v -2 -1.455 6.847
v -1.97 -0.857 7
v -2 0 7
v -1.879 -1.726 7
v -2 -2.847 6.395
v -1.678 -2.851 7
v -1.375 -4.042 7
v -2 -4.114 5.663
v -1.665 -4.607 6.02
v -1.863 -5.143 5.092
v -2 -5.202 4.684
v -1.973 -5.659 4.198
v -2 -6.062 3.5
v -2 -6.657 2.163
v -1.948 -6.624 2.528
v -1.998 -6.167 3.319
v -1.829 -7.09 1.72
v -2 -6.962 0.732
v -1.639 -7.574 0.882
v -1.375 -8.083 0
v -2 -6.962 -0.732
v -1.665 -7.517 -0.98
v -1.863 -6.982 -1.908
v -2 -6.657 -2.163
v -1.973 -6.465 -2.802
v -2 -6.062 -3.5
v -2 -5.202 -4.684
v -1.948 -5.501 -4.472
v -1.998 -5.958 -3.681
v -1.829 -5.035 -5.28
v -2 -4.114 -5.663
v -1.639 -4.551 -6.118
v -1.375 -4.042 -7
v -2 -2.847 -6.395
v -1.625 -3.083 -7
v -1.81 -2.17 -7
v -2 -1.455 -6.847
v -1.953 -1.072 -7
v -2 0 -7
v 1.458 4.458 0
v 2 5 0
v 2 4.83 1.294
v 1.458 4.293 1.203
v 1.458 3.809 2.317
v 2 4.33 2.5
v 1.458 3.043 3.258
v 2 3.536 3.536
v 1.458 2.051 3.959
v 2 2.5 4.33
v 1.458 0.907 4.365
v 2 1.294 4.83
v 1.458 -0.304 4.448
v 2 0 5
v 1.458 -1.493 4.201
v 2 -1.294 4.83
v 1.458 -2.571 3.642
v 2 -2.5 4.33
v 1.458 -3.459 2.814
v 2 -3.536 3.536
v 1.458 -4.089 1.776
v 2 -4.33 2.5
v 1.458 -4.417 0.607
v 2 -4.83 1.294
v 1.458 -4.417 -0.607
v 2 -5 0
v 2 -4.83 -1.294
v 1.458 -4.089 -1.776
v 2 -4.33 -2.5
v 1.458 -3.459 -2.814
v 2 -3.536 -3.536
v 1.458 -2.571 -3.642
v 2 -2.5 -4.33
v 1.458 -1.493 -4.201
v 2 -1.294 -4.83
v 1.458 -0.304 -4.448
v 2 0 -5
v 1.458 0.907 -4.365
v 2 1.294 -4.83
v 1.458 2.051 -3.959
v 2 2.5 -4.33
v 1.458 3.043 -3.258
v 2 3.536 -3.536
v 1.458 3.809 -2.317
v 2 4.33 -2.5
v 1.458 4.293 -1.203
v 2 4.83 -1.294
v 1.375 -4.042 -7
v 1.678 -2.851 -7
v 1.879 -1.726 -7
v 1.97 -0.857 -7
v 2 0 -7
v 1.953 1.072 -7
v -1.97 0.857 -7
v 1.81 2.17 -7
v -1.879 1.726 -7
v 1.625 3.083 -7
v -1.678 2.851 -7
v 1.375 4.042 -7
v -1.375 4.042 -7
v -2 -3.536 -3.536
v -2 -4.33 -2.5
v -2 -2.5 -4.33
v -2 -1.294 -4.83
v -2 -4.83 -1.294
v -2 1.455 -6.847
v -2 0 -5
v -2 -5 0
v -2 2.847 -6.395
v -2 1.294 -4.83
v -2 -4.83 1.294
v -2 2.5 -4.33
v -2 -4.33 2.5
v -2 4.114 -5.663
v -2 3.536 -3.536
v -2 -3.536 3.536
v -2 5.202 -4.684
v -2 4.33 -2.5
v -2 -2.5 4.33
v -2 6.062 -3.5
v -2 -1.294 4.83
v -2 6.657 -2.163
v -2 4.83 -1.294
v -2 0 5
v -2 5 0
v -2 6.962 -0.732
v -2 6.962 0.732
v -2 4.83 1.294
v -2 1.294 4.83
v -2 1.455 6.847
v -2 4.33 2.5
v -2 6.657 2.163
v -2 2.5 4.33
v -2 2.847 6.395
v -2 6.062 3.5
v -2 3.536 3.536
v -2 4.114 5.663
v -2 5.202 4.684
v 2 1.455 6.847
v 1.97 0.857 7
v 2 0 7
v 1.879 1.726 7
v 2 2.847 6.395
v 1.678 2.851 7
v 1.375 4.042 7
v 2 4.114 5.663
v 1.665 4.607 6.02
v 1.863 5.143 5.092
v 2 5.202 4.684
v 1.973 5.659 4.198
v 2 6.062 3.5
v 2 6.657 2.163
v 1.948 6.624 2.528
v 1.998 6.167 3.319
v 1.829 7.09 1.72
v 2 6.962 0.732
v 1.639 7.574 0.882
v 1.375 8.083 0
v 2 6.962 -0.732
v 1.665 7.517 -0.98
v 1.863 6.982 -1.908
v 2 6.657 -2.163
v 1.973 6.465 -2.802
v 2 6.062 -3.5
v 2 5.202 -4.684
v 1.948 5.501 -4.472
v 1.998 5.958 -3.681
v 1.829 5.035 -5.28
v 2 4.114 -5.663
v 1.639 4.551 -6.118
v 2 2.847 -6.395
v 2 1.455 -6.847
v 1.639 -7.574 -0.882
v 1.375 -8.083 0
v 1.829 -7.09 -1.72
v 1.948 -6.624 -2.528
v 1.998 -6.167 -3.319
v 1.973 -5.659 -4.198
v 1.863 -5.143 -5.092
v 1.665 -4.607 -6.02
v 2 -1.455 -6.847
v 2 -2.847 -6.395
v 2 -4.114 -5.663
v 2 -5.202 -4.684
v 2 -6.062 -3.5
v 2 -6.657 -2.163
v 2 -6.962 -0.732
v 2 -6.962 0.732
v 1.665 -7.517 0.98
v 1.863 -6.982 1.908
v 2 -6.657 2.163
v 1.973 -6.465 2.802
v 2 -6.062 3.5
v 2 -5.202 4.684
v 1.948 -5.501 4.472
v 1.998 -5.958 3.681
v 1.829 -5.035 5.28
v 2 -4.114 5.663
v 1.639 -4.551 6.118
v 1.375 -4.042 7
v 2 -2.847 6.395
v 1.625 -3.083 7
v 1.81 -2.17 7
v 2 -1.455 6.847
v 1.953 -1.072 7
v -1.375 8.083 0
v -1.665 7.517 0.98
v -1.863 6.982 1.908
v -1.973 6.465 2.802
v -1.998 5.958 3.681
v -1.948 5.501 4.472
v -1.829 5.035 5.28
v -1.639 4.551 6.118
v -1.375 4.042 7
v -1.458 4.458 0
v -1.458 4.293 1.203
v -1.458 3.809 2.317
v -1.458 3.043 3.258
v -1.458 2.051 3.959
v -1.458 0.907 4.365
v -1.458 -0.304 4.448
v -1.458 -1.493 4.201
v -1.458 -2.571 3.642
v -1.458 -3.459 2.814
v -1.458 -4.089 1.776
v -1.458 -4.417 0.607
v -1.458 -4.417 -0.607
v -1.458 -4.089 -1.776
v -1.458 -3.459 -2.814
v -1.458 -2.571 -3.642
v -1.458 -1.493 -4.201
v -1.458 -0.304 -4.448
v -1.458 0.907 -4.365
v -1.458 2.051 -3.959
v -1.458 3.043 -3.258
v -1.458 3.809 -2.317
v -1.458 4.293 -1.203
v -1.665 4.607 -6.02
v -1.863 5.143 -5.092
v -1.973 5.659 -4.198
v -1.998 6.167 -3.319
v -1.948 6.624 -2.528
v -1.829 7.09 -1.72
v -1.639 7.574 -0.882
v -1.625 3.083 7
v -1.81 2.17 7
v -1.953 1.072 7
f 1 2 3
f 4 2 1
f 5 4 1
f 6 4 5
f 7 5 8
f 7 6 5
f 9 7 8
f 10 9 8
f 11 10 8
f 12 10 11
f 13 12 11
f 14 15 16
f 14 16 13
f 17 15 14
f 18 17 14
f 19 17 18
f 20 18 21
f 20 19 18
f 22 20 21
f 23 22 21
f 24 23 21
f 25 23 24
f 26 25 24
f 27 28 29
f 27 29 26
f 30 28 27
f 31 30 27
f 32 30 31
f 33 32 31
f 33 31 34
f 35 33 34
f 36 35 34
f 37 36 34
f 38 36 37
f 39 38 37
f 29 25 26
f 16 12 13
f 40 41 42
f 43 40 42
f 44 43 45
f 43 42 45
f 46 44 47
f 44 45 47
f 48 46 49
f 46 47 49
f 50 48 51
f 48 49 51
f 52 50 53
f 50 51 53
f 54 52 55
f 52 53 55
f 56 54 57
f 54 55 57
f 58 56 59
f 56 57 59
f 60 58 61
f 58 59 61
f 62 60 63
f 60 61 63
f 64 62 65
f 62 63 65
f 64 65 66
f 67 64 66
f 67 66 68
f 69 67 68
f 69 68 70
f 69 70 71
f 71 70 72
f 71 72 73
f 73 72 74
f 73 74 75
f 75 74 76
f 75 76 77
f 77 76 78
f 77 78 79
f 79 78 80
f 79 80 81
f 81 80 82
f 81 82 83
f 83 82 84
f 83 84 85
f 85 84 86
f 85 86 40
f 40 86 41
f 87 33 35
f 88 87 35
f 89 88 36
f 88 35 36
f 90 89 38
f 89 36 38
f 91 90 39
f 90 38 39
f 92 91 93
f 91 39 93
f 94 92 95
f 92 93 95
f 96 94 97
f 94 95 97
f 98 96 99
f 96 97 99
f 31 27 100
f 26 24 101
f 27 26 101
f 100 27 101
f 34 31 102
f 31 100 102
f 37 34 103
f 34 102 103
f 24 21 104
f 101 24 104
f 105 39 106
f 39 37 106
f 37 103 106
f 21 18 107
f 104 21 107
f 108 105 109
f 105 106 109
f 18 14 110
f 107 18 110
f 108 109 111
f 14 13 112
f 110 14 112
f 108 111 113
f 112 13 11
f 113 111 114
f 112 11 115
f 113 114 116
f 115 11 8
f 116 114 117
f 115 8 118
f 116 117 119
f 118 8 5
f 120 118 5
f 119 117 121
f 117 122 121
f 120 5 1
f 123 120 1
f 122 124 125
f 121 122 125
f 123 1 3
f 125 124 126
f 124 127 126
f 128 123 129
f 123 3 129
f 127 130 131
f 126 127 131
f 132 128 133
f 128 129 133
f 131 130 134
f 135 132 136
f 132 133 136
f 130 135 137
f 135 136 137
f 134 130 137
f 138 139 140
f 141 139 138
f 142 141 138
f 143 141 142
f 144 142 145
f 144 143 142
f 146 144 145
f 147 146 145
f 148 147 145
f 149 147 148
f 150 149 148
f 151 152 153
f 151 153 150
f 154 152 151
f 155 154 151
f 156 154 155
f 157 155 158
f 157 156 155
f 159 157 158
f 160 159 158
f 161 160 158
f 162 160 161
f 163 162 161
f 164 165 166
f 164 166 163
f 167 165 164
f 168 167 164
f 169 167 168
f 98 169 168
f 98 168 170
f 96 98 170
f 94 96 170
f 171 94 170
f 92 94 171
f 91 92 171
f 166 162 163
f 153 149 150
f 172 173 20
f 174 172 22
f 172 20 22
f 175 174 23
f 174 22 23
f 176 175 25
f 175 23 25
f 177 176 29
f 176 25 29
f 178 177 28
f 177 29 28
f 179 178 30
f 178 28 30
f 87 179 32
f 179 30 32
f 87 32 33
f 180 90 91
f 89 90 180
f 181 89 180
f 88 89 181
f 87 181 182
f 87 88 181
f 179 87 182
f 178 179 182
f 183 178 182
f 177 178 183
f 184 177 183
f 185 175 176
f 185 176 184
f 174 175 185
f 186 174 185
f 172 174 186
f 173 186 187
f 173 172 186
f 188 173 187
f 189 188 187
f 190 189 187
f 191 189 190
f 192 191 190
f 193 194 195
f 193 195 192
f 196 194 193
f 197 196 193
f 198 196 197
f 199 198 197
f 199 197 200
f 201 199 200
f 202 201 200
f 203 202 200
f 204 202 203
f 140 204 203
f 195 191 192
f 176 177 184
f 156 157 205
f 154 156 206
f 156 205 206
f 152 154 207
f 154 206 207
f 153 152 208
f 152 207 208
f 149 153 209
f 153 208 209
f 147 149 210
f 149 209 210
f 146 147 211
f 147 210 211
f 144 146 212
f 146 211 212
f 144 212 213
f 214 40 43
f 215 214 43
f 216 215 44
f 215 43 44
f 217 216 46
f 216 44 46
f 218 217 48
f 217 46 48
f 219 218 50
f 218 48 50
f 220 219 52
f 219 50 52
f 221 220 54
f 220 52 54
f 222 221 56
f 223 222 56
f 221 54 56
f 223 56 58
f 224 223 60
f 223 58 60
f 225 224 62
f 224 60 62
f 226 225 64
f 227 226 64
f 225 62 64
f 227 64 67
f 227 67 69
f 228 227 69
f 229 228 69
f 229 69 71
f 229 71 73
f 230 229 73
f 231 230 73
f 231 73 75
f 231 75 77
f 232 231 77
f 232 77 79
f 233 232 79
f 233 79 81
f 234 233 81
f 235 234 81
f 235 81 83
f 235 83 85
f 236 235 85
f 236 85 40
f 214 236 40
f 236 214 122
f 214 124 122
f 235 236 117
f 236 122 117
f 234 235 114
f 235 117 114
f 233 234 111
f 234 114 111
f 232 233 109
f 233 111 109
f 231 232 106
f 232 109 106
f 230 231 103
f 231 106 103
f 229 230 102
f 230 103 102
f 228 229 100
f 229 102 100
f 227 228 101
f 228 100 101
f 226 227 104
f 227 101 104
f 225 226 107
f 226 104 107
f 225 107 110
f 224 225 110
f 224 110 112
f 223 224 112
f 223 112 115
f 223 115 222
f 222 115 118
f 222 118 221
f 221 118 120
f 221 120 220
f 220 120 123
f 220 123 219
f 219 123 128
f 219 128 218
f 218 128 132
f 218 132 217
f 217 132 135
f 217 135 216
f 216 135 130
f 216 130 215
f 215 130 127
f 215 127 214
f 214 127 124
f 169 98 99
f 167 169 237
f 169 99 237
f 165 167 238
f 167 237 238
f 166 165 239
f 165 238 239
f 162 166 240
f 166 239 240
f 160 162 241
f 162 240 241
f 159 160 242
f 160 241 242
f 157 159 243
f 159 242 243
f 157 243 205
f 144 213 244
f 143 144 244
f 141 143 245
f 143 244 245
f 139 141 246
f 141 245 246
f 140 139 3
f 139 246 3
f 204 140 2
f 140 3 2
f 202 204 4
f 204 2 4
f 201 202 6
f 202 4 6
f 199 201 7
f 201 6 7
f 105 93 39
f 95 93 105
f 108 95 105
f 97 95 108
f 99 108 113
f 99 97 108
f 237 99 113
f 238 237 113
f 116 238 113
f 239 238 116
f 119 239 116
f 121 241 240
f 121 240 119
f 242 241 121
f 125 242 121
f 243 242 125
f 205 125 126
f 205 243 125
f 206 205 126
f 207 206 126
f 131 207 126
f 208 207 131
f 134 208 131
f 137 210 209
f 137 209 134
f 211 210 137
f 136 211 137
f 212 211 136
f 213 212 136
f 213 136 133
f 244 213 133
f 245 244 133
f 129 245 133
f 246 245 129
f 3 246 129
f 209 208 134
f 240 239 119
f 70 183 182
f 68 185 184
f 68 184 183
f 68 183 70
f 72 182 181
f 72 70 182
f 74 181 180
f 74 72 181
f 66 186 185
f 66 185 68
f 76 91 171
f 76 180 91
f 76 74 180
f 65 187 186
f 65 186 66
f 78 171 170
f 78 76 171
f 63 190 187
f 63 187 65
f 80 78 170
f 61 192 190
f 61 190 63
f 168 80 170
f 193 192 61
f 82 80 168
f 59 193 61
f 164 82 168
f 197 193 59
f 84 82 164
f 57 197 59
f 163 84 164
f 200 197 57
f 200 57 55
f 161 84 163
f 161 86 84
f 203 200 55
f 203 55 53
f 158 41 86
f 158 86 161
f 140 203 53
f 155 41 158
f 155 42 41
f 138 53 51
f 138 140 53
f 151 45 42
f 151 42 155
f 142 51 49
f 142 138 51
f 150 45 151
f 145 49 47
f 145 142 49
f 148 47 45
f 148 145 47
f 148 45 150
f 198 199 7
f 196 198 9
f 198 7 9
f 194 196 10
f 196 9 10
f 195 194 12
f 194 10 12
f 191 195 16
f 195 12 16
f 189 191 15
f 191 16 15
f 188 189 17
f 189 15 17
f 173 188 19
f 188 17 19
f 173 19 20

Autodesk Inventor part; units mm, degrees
sketch "B" plane through (0, 0, 0) normal (1, 0, 0) x (0, 1, 0)
  line L0 (-4.0415, 7) -> (-8.0829, 0)
  line L1 (-8.0829, 0) -> (-4.0415, -7)
  line L2 (-4.0415, -7) -> (4.0415, -7)
  line L3 (4.0415, -7) -> (8.0829, 0)
  line L4 (8.0829, 0) -> (4.0415, 7)
  line L5 (4.0415, 7) -> (-4.0415, 7)
extrude "Extrusion1" add sketch "B" along normal mid plane 4
sketch "Sketch_2" plane through (0, 0, 0) normal (0, 0, 1) x (1, 0, 0)
  line L0 (2, 0) -> (-2, 0)
  line L1 (-2, 0) -> (-2, 5)
  line L2 (-2, 5) -> (-1.4585, 4.4585)
  line L3 (-1.4585, 4.4585) -> (1.4585, 4.4585)
  line L4 (1.4585, 4.4585) -> (2, 5)
  line L5 (2, 5) -> (2, 0)
  line L6 (2, 0) -> (-2, 0)
revolve "Revolution1" cut sketch "Sketch_2" angle 360 about axis through (2, 0, 0) along (1, 0, 0)
thread "Thread1" size "M10x1" class "6H" standard "ISO Metric profile" full length
sketch "Sketch_3" plane through (0, 0, 0) normal (0, 0, 1) x (1, 0, 0)
  line L0 (50, 0) -> (-50, 0)
  line L1 (-7, 1) -> (-2, 1)
  line L2 (-2, 1) -> (-2, 7)
  line L3 (-2, 7) -> (0, 10.4641)
  line L4 (0, 10.4641) -> (2, 7)
  line L5 (2, 7) -> (2, 1)
  line L6 (2, 1) -> (7, 1)
  line L7 (7, 1) -> (7, 17)
  line L8 (7, 17) -> (-7, 17)
  line L9 (-7, 17) -> (-7, 1)
revolve "Revolution2" cut sketch "Sketch_3" angle 360 about axis through (50, 0, 0) along (1, 0, 0)
ref_plane "nt_XY" through (0, 0, 0) normal (1, 0, 0) x (0, 0, -1)
ref_plane "nt_YZ" through (0, 0, 0) normal (0, 0, -1) x (0, 1, 0)
ref_plane "nt_ZX" through (0, 0, 0) normal (0, 1, 0) x (1, 0, 0)
ref_plane "ntj_XY" through (2, 0, 0) normal (1, 0, 0) x (0, 0, -1)
ref_plane "ntj_YZ" through (2, 0, 0) normal (0, 0, -1) x (0, 1, 0)
ref_plane "ntj_ZX" through (2, 0, 0) normal (0, 1, 0) x (1, 0, 0)
properties part number "SNJ-016C"
